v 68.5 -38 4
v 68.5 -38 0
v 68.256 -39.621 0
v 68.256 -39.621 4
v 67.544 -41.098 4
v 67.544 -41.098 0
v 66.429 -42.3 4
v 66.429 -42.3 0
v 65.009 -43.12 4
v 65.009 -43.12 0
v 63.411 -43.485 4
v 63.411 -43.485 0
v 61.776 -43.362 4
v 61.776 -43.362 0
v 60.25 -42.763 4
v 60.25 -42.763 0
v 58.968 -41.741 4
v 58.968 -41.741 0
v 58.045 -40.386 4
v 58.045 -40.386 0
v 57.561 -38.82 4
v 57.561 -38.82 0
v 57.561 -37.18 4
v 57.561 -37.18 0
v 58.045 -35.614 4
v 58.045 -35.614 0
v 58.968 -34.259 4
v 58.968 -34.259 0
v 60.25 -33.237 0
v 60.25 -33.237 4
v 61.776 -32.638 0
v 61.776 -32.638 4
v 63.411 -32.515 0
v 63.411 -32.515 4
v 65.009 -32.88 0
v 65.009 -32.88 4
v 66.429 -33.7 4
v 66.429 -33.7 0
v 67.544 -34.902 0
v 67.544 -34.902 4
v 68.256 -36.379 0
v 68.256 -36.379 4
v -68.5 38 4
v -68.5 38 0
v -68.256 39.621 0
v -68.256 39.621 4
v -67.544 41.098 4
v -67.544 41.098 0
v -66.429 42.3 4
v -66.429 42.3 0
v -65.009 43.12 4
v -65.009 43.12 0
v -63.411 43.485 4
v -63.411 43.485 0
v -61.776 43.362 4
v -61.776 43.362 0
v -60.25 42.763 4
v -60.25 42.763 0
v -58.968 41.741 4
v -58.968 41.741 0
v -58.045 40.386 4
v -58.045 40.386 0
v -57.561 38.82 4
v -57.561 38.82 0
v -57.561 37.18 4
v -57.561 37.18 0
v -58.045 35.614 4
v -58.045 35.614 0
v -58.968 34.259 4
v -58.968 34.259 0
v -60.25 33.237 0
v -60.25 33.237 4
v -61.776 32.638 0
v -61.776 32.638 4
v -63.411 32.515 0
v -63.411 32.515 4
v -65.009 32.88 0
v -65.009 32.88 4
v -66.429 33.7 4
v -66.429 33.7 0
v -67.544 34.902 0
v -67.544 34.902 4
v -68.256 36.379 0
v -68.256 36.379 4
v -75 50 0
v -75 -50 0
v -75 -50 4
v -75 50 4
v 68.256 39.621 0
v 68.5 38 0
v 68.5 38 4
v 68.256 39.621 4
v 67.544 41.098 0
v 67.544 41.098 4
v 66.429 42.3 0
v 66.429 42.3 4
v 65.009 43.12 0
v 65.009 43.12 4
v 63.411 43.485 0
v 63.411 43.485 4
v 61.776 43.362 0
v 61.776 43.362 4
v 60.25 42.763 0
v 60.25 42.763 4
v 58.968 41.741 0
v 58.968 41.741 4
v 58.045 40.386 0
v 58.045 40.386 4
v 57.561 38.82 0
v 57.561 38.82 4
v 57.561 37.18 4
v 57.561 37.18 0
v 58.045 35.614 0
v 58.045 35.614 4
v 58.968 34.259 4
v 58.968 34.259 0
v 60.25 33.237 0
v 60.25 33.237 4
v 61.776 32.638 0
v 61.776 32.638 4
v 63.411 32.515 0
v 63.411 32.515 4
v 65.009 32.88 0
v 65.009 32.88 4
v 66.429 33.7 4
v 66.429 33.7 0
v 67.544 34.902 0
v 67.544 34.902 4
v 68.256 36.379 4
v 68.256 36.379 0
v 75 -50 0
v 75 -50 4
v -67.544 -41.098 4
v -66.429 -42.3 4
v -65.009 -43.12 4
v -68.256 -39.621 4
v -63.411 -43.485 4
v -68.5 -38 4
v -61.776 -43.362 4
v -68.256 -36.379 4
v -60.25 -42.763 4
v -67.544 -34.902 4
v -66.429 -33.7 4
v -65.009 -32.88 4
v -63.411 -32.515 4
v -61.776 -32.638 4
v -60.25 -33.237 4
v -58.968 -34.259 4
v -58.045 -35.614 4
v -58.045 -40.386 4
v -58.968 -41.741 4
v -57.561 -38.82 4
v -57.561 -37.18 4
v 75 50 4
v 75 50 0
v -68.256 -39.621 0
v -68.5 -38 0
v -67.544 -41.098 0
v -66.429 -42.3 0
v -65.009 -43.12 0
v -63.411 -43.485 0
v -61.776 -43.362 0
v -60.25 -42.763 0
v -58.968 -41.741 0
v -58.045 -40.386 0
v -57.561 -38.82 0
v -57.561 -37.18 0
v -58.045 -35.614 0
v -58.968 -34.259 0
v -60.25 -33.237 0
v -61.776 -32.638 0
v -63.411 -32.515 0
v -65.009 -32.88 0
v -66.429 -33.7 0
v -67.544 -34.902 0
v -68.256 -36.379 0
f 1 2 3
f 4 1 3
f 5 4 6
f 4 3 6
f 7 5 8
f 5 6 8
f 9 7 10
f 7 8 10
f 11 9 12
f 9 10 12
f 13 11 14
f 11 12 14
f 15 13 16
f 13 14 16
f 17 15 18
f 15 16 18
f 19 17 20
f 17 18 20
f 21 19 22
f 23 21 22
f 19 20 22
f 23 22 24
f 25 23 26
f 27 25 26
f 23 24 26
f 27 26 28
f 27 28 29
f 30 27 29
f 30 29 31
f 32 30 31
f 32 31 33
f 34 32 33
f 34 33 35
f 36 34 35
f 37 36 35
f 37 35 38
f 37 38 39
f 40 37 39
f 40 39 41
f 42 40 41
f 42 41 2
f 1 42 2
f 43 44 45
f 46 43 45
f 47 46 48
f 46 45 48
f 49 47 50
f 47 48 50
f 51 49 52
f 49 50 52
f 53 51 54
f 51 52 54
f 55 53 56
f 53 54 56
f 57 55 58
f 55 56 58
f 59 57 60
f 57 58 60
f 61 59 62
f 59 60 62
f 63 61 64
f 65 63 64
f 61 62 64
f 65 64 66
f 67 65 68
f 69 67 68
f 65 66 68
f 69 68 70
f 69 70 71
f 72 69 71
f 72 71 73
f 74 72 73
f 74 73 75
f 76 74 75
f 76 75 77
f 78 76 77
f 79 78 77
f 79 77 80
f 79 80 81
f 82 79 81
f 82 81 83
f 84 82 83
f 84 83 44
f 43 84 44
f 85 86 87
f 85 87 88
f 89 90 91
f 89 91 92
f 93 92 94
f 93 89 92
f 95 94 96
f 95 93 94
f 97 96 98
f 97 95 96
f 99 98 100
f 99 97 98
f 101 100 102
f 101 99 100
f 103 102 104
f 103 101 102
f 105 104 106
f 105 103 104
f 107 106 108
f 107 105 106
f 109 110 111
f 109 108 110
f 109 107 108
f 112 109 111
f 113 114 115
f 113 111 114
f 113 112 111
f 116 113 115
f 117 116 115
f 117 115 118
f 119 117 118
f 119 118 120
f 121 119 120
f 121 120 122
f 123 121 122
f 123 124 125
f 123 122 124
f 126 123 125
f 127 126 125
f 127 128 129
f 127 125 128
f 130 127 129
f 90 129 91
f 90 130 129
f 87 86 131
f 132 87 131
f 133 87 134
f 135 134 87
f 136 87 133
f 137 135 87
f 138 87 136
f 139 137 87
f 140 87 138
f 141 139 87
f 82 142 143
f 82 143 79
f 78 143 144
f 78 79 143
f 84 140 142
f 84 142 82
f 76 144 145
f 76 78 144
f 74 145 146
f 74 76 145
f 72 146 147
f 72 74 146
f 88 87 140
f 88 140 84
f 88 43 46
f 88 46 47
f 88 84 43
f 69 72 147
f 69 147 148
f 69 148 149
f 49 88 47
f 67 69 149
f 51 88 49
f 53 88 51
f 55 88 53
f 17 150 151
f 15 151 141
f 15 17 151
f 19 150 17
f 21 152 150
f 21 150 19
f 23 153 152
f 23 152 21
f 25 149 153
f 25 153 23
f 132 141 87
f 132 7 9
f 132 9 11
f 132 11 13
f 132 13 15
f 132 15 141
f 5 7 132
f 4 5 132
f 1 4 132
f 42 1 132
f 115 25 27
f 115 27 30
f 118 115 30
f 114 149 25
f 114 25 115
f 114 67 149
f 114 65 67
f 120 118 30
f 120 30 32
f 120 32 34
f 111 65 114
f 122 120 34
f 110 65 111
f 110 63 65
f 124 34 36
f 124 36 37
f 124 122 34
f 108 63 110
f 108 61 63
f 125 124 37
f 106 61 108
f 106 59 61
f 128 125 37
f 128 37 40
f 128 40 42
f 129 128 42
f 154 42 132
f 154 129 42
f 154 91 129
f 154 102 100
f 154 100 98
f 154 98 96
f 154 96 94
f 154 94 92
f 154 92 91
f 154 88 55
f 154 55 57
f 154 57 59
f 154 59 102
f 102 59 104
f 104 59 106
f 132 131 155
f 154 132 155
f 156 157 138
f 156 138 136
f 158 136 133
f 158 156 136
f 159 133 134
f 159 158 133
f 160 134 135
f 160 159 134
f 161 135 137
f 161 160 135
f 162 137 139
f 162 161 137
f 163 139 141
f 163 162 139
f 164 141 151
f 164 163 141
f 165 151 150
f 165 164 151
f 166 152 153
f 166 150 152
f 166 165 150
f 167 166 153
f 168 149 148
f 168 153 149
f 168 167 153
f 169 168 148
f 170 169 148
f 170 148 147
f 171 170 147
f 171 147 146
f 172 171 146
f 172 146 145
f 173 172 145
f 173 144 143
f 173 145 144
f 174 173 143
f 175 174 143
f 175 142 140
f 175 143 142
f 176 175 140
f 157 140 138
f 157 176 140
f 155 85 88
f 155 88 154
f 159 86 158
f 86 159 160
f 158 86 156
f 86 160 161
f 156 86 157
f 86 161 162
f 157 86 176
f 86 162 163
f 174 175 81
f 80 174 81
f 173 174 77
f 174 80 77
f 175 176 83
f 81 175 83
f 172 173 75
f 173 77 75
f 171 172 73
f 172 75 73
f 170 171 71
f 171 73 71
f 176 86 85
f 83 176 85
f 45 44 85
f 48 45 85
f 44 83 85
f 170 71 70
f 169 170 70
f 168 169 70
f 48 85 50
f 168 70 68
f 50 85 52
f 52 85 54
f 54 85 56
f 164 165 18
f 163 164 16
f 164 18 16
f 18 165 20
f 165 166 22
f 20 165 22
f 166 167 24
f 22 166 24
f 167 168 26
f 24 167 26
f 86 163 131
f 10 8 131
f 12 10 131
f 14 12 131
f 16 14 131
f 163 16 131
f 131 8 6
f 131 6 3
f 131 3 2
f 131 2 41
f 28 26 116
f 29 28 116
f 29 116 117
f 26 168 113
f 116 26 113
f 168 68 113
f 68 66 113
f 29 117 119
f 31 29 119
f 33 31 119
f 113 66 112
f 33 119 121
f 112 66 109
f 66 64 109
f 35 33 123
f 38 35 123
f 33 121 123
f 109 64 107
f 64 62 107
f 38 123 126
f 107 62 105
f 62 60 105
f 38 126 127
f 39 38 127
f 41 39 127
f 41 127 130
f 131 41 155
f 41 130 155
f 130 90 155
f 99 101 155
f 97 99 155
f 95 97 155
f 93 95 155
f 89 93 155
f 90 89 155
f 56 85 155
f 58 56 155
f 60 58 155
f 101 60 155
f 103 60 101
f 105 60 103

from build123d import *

# Parameters (mm, degrees)
SZKIC1_W                             = 150
SZKIC1_H                             = 100
DODANIE_WYCI_GNI_CIE1_DEPTH          = 4
OTW_R_POD_RUB_M101_D                 = 11
LUSTRO1_AT_THE_SECOND_PLANE_COPY_1_D = 11


with BuildPart() as part:
    # Szkic1 → Dodanie-wyciągnięcie1 (new body)
    with BuildSketch(Plane.XY):
        Rectangle(SZKIC1_W, SZKIC1_H)
    extrude(amount=DODANIE_WYCI_GNI_CIE1_DEPTH)

    # Otwór pod śrubę M101 (through all)
    with Locations(Plane.XY.offset(4)):
        with Locations((-63, 38)):
            otw_r_pod_rub_m101 = Hole(OTW_R_POD_RUB_M101_D / 2)

    # Lustro1: Otwór pod śrubę M101 across plane
    add(otw_r_pod_rub_m101.mirror(Plane.ZX), mode=Mode.SUBTRACT)

    # Lustro1 at the second plane: Otwór pod śrubę M101 across plane
    add(otw_r_pod_rub_m101.mirror(Plane(origin=(0, 0, 0), x_dir=(0, 0, 1), z_dir=(1, 0, 0))), mode=Mode.SUBTRACT)

    # Lustro1 at the second plane copy 1 (through all)
    with Locations(Plane(origin=(0, 0, 4), x_dir=(-1, 0, 0), z_dir=(0, 0, 1))):
        with Locations((-63, 38)):
            Hole(LUSTRO1_AT_THE_SECOND_PLANE_COPY_1_D / 2)


solid = part.part
